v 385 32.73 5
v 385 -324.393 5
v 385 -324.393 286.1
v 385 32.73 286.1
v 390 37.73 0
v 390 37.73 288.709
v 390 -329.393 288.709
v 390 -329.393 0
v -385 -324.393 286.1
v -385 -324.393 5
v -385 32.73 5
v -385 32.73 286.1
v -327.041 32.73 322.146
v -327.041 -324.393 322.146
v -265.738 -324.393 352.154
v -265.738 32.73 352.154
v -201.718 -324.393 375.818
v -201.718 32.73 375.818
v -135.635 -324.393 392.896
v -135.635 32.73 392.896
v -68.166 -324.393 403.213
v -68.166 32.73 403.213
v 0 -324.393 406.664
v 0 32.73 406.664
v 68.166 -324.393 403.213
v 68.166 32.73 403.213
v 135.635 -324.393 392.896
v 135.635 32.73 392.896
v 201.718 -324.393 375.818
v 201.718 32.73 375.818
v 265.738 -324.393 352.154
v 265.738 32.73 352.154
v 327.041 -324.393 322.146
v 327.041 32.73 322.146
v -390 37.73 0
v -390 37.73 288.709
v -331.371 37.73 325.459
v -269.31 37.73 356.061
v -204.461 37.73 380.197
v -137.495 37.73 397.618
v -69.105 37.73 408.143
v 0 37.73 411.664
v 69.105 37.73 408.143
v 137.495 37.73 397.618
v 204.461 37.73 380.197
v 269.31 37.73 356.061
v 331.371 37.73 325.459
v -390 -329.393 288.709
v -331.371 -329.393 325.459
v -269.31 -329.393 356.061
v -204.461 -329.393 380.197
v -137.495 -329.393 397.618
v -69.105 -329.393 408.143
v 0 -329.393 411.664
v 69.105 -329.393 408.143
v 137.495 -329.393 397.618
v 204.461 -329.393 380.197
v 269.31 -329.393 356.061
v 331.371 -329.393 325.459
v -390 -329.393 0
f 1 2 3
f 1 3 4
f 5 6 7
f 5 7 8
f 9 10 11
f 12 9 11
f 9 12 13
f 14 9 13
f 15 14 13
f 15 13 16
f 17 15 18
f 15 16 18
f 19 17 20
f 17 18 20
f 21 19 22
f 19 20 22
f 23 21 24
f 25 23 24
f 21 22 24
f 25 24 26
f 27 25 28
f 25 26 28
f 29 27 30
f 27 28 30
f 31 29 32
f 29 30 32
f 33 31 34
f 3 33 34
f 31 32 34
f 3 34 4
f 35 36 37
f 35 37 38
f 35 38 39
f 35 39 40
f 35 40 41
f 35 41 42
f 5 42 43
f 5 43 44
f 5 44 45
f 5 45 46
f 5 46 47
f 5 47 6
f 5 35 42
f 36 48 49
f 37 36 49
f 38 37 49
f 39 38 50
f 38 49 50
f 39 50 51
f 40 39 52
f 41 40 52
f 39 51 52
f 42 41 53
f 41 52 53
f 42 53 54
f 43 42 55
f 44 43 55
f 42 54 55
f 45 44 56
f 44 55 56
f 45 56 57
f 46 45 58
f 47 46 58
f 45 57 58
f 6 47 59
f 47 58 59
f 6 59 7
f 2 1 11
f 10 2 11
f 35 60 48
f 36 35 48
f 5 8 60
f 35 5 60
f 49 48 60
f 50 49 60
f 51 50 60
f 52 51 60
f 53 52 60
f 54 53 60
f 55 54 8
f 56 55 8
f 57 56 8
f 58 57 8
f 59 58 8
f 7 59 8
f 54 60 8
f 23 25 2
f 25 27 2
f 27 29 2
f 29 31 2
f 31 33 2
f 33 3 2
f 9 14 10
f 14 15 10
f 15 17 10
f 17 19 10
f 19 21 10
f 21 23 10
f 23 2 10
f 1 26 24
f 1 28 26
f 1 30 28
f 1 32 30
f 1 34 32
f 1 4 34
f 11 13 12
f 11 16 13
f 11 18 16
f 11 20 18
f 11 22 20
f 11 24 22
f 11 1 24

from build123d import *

# Parameters (mm, degrees)
EXTRUDE_START            = -329.393398282
EXTRUDE_1_DEPTH          = 367.123106012
CUT_EXTRUDE_2_REACH      = 654.668
CUT_EXTRUDE_2_END_RADIUS = 675
SKETCH_4_W               = 770
SKETCH_4_H               = 357.123106012


# Read off the part's stored shape, not the designer's step: 凸台-拉伸1
with BuildPart() as part:
    # 凸台-拉伸1 outline → 凸台-拉伸1 (new body)
    with BuildSketch(Plane(origin=(0, 0, 0), x_dir=(1, 0, 0), z_dir=(0, 1, 0)).offset(EXTRUDE_START)):
        with BuildLine():
            Line((390, -288.70946964), (390, 0))
            Line((390, 0), (-390, 0))
            Line((-390, 0), (-390, -288.70946964))
            ThreePointArc((-390, -288.70946964), (0, -411.663690552), (390, -288.70946964))
        make_face()
    extrude(amount=EXTRUDE_1_DEPTH)

    # 切除-拉伸2: up to this cylinder (the profile starts inside it)
    cut_extrude_2_end = Plane(origin=(0, -145.831845, -268.336309448), z_dir=(0, 1, 0)) * Cylinder(CUT_EXTRUDE_2_END_RADIUS, 2660.336, mode=Mode.PRIVATE)
    # 草图4 → 切除-拉伸2 (cut, up to the surface)
    with BuildSketch(Plane(origin=(0, 0, 5), x_dir=(-1, 0, 0), z_dir=(0, 0, -1)), mode=Mode.PRIVATE) as cut_extrude_2_sk1:
        with Locations((0, -145.831845276)):
            Rectangle(SKETCH_4_W, SKETCH_4_H)
    cut_extrude_2_tool1 = extrude(cut_extrude_2_sk1.sketch, amount=-CUT_EXTRUDE_2_REACH, mode=Mode.PRIVATE) & cut_extrude_2_end
    add(cut_extrude_2_tool1.solids().sort_by_distance((0, -145.831845, 5))[0], mode=Mode.SUBTRACT)


solid = part.part
